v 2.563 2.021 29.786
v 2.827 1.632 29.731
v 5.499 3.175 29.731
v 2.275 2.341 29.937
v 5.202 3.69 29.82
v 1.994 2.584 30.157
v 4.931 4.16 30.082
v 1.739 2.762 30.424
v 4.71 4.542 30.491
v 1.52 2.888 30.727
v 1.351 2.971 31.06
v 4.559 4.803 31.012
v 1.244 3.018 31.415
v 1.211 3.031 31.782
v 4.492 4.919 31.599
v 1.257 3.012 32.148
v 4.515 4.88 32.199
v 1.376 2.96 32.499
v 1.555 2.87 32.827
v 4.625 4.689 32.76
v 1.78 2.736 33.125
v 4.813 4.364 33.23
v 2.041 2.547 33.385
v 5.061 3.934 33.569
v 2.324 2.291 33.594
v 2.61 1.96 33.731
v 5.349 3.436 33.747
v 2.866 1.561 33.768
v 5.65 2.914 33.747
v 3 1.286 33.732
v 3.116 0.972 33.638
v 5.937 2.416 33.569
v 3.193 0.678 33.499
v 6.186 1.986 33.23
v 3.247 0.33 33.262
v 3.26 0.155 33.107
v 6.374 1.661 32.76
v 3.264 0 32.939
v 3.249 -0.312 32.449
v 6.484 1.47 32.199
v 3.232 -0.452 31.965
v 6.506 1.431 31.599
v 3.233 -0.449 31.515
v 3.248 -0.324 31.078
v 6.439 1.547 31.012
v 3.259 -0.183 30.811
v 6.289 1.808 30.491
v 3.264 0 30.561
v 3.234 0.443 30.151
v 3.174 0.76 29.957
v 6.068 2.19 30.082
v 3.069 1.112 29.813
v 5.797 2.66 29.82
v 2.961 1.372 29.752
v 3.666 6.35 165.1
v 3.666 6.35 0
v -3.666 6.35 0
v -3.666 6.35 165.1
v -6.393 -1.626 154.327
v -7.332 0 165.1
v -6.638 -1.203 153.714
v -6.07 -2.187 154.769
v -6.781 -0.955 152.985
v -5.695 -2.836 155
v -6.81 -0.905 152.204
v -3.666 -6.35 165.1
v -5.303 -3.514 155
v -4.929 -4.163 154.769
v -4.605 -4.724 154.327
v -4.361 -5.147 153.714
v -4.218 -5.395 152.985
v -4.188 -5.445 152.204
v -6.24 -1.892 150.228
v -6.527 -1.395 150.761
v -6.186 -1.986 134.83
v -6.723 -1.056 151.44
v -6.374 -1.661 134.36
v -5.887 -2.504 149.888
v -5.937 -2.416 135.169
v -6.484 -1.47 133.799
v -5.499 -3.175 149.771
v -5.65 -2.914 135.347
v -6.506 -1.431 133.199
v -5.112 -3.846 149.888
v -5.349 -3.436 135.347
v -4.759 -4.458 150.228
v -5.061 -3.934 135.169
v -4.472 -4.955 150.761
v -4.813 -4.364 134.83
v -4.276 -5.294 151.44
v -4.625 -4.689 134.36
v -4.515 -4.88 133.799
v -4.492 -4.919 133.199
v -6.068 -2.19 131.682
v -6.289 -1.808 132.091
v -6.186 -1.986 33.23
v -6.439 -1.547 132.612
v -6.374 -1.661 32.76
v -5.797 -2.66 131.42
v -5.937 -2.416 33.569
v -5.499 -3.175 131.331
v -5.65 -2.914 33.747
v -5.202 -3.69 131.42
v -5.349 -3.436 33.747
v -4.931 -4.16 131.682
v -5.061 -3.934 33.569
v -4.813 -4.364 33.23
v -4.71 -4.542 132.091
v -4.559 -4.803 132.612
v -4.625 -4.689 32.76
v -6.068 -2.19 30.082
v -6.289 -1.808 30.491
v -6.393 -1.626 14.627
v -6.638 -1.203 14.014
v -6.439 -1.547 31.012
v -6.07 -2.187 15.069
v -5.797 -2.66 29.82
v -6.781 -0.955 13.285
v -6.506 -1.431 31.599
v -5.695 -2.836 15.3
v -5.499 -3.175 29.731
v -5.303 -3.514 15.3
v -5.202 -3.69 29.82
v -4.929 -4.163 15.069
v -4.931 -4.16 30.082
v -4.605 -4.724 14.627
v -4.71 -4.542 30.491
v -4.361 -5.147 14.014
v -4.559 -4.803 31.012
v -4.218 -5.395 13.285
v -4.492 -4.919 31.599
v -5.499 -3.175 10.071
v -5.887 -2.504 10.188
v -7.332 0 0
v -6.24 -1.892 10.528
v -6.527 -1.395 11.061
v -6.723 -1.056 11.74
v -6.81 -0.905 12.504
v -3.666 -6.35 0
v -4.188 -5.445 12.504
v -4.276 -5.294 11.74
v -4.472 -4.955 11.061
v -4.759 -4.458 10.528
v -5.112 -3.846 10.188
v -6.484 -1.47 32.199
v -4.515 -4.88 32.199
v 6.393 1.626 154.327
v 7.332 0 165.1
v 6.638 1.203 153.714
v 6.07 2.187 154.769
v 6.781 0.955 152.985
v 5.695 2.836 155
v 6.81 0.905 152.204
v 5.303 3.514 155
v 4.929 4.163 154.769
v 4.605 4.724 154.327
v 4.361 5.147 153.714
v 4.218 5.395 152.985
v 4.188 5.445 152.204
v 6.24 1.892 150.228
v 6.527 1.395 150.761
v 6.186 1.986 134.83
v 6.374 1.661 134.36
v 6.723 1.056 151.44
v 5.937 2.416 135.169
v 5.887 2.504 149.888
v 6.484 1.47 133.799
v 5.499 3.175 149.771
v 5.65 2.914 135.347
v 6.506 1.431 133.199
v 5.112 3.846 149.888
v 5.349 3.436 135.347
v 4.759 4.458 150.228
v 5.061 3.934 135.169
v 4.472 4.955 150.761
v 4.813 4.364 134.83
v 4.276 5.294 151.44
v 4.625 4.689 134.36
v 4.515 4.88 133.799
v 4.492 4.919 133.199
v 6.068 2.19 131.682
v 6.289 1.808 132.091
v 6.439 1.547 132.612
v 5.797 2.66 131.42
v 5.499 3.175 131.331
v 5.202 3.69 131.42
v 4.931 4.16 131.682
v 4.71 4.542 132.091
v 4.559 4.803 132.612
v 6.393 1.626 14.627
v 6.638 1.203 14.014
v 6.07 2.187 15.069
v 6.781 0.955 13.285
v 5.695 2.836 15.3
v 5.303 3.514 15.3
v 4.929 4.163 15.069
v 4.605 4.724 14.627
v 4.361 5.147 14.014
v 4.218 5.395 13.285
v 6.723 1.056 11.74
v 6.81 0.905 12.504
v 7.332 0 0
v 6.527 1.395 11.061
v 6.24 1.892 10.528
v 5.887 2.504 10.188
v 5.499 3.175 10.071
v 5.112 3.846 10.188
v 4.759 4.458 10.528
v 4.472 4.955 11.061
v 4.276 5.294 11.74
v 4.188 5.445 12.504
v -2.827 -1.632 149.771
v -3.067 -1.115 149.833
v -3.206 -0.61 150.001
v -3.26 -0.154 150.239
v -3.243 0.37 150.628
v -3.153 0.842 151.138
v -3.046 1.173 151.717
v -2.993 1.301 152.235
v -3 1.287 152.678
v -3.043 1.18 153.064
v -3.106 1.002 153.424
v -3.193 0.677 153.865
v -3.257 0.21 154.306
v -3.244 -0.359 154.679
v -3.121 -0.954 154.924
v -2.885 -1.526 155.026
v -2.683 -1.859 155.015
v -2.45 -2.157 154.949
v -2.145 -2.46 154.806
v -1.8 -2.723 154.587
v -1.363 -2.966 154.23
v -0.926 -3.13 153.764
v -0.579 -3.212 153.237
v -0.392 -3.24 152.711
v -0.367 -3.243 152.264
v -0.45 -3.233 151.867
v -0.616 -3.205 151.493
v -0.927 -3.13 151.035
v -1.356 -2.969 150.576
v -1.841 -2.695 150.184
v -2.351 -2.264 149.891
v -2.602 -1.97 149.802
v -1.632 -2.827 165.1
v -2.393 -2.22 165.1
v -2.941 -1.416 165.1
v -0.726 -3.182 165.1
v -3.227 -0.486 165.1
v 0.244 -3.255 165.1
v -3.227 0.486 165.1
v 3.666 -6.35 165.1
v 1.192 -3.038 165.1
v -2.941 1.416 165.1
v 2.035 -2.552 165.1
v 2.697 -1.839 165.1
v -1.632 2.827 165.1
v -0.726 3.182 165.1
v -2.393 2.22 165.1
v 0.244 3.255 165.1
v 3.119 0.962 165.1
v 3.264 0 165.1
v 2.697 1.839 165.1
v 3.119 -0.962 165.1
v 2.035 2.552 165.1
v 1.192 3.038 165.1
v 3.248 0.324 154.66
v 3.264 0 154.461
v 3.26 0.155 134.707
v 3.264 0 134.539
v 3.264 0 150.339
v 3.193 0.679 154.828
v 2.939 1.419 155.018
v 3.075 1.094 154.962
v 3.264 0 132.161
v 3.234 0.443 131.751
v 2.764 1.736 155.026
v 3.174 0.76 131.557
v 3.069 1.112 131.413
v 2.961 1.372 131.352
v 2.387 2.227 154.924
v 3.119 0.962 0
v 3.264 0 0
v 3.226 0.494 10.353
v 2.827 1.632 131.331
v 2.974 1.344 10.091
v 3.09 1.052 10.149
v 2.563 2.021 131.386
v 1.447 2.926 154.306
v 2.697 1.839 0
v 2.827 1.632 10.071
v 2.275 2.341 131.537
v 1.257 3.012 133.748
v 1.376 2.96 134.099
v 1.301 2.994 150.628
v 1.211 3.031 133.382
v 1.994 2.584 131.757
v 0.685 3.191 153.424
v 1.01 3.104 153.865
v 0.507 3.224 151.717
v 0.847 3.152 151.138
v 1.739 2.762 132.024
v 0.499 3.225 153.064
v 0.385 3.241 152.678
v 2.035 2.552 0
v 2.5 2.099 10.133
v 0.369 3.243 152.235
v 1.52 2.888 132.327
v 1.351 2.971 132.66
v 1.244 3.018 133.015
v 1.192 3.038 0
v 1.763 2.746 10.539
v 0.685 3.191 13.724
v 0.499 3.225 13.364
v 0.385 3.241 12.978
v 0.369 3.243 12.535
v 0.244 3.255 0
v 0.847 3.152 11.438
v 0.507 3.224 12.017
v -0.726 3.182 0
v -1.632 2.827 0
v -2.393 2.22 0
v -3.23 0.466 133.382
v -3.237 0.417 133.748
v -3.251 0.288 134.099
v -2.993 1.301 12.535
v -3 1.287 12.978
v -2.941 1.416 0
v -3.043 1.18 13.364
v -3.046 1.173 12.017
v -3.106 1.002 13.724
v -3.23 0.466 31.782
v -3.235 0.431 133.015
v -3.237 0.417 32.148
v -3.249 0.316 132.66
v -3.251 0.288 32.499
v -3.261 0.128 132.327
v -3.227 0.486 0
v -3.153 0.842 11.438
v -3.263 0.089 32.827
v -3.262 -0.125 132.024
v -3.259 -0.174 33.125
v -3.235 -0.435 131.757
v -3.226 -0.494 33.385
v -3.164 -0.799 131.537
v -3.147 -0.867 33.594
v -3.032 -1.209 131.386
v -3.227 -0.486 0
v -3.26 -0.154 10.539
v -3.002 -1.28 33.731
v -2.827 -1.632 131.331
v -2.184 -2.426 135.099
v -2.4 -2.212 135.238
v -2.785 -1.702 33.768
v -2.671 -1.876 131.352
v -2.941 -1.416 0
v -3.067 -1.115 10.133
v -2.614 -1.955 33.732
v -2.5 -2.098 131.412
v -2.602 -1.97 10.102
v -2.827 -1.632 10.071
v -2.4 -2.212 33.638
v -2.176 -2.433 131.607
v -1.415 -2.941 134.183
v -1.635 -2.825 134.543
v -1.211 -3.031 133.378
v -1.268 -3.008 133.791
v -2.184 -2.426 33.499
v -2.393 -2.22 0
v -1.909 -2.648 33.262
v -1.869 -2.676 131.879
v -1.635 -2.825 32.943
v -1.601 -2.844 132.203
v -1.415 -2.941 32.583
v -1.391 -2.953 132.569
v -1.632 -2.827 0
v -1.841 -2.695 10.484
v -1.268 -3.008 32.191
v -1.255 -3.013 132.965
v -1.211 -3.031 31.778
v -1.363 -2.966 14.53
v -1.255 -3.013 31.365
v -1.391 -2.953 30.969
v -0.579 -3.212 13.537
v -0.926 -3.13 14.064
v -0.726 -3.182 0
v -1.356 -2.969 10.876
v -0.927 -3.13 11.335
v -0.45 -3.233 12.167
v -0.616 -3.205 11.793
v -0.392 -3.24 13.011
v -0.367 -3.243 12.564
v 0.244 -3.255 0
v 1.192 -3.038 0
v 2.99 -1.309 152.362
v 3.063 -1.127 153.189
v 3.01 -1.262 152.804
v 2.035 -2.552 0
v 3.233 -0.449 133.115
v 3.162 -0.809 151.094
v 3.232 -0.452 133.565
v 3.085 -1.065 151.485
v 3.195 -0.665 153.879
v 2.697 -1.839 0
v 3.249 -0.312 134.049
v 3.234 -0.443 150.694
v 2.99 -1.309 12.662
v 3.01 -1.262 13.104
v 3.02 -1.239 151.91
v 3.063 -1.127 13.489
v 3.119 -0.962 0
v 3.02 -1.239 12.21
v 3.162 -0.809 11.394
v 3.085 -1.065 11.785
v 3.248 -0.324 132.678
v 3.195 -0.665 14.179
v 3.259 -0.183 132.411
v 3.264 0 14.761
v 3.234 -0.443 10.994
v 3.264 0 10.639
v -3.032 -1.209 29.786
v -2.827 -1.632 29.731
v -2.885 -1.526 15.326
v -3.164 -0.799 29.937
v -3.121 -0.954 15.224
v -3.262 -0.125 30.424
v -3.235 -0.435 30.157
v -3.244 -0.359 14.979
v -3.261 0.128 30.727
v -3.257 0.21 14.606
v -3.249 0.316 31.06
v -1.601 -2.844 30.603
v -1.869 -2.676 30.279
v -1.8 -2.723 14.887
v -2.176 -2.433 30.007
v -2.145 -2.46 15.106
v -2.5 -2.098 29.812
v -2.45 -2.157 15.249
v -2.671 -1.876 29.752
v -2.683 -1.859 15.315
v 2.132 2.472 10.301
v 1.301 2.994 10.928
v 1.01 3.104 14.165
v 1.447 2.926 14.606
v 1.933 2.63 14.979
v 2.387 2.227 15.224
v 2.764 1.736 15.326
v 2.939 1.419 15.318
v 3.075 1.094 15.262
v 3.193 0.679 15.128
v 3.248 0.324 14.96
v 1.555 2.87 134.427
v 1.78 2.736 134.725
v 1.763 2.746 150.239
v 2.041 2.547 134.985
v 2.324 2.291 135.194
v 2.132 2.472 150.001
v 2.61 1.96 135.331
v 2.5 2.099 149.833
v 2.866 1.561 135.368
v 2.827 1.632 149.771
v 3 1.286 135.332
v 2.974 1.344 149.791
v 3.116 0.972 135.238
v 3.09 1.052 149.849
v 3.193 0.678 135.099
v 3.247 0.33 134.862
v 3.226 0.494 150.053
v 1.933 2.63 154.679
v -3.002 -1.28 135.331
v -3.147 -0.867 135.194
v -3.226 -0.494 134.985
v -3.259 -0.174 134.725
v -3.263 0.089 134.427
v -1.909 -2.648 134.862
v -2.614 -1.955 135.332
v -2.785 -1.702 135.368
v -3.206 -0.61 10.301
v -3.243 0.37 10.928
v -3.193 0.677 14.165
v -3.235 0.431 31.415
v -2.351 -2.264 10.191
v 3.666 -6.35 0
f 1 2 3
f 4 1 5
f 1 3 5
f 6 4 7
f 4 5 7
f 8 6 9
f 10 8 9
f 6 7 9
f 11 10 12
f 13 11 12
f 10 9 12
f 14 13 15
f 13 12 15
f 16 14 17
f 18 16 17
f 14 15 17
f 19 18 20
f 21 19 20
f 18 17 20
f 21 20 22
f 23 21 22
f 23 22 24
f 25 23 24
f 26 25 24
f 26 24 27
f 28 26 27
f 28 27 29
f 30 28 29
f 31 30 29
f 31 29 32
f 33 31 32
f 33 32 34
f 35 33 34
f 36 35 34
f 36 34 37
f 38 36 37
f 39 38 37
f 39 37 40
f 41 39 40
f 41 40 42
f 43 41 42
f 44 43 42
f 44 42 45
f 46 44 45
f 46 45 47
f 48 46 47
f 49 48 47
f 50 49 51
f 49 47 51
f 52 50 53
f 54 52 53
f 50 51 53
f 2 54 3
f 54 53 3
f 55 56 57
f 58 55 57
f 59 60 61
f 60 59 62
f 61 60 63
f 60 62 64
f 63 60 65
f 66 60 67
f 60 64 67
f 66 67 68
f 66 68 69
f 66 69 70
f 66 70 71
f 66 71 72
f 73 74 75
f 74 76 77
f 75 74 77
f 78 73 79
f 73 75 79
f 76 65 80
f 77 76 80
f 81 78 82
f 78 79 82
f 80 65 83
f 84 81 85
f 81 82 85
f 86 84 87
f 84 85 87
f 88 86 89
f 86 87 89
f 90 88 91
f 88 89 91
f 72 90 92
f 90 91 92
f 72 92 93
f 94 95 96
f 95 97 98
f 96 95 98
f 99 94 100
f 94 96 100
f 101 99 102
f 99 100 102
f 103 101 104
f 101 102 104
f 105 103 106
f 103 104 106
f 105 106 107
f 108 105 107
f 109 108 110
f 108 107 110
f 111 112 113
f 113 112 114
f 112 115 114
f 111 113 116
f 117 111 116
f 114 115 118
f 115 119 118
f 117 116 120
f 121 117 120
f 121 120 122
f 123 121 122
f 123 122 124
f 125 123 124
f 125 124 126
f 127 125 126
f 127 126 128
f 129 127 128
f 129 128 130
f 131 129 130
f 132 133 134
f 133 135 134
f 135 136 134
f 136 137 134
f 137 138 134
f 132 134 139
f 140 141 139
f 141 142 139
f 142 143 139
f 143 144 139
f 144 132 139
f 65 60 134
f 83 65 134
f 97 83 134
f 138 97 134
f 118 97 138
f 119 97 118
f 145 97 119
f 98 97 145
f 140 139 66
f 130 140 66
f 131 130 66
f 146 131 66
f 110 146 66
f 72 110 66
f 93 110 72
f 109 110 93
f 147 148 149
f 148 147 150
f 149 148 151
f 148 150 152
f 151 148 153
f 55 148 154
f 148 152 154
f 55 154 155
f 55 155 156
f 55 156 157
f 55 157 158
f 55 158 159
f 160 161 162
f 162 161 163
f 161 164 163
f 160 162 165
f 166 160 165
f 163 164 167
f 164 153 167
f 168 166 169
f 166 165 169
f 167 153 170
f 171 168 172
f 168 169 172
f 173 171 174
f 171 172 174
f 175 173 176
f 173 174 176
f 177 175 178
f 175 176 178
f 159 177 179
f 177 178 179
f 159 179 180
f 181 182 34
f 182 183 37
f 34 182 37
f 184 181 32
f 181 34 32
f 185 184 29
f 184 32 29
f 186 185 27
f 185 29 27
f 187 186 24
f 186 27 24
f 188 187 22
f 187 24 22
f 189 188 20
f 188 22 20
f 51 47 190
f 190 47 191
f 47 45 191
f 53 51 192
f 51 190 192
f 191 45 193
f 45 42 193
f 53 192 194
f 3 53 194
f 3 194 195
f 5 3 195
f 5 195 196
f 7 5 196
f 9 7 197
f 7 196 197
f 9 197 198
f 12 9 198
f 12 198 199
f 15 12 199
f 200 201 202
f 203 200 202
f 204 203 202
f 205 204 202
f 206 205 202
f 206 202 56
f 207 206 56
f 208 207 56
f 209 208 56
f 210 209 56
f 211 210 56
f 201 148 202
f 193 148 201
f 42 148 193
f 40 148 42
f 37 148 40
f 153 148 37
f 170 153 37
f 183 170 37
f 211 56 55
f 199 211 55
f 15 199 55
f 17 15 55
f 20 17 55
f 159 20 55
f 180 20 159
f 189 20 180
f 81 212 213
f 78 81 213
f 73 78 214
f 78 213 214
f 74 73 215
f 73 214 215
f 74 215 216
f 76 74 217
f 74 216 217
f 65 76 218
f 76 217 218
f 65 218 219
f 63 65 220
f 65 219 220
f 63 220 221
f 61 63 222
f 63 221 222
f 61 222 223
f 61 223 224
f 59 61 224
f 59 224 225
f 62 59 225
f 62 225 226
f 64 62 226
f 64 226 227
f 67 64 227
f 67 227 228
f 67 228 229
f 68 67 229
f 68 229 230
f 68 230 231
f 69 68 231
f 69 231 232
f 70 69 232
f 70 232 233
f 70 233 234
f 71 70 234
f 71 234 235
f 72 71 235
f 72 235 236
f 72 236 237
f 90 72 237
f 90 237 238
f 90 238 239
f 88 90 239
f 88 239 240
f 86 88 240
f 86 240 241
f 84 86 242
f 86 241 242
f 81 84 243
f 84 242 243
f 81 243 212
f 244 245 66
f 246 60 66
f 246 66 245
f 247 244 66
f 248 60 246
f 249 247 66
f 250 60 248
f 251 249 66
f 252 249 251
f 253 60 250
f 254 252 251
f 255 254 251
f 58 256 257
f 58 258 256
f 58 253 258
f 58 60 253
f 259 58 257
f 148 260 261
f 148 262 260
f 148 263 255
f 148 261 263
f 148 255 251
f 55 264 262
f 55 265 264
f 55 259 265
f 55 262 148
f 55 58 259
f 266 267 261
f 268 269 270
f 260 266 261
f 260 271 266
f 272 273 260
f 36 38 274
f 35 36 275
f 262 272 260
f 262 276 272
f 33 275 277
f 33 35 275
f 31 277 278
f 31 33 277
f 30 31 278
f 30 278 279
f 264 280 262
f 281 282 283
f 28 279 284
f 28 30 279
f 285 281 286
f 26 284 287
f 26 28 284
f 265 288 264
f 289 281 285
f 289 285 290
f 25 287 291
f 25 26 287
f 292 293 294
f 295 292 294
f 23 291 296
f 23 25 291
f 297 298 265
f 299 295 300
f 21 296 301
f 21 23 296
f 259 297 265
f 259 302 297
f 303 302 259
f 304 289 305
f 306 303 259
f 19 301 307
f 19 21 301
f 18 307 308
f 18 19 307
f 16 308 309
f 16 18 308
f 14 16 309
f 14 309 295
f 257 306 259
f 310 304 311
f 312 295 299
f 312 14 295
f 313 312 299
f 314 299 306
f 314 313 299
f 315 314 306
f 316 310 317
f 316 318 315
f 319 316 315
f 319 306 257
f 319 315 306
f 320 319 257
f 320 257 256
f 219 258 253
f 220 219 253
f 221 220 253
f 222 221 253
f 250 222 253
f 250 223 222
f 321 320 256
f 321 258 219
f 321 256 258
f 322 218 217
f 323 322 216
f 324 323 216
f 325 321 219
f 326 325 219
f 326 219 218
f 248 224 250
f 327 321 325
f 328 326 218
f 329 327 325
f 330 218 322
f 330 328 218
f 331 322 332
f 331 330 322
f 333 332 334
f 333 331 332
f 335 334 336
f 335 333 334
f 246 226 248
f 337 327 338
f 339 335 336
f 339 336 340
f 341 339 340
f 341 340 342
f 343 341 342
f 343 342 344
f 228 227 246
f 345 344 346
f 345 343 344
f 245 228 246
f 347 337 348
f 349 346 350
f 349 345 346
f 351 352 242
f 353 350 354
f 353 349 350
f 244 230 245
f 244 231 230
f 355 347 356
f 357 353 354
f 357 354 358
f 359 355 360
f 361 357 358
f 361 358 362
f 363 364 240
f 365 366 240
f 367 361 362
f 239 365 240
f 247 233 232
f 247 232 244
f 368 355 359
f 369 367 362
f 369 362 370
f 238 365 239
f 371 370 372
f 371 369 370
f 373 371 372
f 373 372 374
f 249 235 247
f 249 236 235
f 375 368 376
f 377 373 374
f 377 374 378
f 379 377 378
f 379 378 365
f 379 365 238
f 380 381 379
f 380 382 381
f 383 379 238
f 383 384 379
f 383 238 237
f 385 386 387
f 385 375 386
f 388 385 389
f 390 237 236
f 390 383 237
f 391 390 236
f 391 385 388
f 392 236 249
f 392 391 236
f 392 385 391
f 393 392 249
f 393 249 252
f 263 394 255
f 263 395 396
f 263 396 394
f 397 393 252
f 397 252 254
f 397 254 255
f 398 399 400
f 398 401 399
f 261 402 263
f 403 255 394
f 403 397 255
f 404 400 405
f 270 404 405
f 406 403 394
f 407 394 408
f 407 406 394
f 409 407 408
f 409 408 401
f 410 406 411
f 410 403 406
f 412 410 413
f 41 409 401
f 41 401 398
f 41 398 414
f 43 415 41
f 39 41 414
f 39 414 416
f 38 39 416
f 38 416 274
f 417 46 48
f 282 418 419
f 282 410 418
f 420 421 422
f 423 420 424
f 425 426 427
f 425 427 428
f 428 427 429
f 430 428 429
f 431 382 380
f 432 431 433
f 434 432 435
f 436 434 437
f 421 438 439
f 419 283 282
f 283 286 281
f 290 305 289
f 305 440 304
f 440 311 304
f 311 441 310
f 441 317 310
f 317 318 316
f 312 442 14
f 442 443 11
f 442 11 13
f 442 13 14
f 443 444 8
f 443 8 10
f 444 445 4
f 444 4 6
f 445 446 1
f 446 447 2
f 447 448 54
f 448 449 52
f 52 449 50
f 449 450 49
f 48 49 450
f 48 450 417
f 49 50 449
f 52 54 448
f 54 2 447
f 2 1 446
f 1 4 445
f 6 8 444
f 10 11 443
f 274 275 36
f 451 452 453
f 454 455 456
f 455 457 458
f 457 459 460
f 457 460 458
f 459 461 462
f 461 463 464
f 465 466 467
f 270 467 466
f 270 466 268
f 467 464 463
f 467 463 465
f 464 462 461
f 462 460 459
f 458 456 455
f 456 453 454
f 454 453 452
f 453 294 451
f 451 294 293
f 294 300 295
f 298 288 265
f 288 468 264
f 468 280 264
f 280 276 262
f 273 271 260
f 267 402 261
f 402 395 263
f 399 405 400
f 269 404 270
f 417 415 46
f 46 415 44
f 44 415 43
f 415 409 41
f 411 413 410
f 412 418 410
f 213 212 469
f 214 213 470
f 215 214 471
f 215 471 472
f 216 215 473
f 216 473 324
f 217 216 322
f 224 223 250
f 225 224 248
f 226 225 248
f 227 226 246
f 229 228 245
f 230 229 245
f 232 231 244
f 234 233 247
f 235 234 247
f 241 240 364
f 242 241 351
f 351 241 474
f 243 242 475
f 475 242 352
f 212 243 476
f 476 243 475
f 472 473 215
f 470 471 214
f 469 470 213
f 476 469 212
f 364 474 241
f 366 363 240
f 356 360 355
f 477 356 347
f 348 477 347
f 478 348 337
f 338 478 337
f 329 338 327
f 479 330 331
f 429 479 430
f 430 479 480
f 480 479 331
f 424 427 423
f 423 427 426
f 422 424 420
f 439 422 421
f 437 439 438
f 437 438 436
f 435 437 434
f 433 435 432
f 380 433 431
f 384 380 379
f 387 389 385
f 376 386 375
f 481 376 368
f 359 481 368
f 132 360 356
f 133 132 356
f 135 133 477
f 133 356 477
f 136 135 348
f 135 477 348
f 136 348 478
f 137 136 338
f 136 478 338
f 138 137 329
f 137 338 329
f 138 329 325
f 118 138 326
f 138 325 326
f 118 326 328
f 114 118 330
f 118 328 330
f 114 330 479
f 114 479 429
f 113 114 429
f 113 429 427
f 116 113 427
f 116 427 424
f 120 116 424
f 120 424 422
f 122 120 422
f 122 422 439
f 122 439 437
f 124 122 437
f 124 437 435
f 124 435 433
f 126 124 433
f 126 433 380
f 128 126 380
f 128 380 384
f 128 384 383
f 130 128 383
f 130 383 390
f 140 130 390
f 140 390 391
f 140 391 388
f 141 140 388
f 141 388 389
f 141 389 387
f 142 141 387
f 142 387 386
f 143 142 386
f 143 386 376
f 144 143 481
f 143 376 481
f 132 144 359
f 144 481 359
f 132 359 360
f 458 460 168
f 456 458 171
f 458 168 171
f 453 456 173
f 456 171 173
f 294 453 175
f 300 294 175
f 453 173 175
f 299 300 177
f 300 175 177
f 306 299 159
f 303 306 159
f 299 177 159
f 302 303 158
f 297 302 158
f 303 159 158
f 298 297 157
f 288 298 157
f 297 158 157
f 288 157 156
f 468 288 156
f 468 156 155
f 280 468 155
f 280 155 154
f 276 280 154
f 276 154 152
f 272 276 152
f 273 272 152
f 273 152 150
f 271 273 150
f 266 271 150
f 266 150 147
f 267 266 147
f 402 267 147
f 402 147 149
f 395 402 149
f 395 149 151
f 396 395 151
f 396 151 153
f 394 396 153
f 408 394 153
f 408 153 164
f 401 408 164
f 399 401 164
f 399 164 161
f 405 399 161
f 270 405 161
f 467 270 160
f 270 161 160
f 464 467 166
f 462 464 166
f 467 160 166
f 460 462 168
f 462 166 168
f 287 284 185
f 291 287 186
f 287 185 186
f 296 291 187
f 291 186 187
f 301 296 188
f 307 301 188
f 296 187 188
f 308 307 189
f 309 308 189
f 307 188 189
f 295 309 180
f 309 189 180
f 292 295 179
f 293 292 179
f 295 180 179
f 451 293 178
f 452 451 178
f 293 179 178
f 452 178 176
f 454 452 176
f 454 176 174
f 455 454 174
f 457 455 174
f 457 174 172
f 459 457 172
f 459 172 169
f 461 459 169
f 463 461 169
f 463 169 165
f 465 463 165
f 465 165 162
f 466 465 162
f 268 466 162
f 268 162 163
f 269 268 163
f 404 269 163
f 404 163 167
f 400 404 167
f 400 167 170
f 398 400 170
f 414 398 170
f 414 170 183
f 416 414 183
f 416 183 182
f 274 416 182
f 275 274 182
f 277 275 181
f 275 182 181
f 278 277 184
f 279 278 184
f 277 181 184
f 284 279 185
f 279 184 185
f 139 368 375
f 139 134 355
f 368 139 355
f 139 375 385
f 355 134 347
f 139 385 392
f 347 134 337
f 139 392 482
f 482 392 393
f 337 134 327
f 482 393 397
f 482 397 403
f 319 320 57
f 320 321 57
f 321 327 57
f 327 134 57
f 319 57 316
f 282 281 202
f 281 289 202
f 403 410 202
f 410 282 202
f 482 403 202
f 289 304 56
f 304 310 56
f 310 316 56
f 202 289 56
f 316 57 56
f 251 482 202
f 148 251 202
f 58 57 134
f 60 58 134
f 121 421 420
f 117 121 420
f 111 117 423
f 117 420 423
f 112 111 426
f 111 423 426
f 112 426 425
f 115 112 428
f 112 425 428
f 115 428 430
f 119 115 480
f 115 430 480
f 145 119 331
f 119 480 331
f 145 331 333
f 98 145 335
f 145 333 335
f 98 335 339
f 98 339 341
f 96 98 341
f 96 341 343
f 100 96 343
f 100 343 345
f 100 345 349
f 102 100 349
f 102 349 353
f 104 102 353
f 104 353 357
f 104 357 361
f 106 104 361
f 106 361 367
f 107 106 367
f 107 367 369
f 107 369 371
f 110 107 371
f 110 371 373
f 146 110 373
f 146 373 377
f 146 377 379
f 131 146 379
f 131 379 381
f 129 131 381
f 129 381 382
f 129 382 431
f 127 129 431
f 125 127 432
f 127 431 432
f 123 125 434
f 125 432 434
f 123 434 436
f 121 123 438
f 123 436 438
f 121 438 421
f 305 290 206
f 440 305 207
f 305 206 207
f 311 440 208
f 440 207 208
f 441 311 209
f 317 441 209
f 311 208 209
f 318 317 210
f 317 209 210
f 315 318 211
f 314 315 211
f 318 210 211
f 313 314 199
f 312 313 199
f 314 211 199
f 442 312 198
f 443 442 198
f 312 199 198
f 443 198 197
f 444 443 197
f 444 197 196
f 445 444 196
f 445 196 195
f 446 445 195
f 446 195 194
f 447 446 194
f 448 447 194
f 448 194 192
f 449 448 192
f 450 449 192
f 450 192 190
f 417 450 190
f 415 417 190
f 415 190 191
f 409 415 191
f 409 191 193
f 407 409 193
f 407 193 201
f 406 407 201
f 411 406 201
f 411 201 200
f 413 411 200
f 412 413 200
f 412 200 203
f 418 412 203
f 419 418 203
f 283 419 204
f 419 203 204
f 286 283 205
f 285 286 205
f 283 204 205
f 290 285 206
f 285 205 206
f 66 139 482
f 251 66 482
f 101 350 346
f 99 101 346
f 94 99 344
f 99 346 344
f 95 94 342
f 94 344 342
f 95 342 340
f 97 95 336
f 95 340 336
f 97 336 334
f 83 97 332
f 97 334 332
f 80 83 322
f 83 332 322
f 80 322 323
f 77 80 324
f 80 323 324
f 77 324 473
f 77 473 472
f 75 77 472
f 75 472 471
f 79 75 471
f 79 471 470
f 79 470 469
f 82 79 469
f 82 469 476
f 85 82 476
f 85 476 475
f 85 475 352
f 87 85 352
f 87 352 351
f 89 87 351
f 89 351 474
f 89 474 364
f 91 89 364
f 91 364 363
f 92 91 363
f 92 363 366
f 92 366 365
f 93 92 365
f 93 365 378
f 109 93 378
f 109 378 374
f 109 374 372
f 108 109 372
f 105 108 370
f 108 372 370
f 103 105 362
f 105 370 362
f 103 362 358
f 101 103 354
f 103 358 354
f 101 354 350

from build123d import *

# Parameters (mm, degrees)
SKETCH1_R           = 3.2639
BOSS_EXTRUDE1_DEPTH = 165.1
SKETCH2_R           = 2.0193
SKETCH2_R_2         = 2.6289
CUT_EXTRUDE1_DEPTH  = 16.875


with BuildPart() as part:
    # Sketch1 → Boss-Extrude1 (new body)
    with BuildSketch(Plane.XY):
        Polygon((-3.666174209, 6.35), (-7.332348419, 0), (-3.666174209, -6.35), (3.666174209, -6.35), (7.332348419, 0), (3.666174209, 6.35), align=None)
        Circle(SKETCH1_R, mode=Mode.SUBTRACT)
    extrude(amount=BOSS_EXTRUDE1_DEPTH)

    # Sketch2 → Cut-Extrude1 (cut, through all)
    with BuildSketch(Plane(origin=(5.499261314, 3.175, 0), x_dir=(0, 0, -1), z_dir=(0.866025404, 0.5, 0))):
        with Locations((-31.75, 0)):
            Circle(SKETCH2_R)
        with Locations((-133.35, 0)):
            Circle(SKETCH2_R)
        with Locations((-12.7, 0)):
            Circle(SKETCH2_R_2)
        with Locations((-152.4, 0)):
            Circle(SKETCH2_R_2)
    extrude(amount=-CUT_EXTRUDE1_DEPTH, mode=Mode.SUBTRACT)


solid = part.part
